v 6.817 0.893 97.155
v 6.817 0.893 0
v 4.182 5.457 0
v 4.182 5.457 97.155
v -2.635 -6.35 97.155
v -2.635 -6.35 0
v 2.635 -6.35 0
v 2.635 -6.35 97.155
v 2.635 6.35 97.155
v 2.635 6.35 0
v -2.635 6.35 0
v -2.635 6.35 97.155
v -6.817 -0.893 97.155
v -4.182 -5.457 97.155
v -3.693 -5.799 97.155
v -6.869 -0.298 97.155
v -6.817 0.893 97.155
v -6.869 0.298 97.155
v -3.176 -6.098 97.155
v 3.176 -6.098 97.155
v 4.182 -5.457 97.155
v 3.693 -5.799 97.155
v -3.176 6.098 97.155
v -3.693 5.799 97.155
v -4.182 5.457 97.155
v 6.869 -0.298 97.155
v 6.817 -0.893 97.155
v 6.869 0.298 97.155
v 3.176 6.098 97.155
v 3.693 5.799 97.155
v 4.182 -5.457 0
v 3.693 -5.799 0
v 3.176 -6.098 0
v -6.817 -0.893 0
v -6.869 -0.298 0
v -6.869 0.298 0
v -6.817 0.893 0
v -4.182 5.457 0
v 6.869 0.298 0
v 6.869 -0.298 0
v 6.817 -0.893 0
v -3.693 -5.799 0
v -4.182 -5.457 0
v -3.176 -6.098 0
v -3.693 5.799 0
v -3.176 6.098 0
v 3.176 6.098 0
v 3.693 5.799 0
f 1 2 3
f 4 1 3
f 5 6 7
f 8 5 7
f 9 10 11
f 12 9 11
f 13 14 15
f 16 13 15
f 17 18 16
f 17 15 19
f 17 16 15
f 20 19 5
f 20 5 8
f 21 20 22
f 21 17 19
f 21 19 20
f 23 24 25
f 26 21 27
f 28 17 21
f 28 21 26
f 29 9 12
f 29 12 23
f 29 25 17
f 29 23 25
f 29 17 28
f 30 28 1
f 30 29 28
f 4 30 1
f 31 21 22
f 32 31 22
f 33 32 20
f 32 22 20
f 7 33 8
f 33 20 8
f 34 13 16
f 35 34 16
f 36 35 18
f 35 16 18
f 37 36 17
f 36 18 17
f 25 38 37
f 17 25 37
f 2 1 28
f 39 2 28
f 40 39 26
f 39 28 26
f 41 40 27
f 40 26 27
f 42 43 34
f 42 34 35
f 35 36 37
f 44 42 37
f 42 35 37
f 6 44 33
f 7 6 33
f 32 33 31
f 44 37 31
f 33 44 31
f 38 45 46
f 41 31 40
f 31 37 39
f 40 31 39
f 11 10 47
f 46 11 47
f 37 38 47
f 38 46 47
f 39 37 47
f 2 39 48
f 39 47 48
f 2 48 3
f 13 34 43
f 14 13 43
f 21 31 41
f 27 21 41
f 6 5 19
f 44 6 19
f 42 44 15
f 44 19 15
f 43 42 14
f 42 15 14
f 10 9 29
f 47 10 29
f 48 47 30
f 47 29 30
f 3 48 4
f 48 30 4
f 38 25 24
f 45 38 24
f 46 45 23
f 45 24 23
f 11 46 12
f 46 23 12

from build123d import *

# Parameters (mm, degrees)
BOSS_EXTRUDE1_DEPTH = 7.9375
BOSS_EXTRUDE4_DEPTH = 89.2175
CUT_EXTRUDE2_DEPTH  = 98.63800417


with BuildPart() as part:
    # Sketch2 → Boss-Extrude1 (new body)
    with BuildSketch(Plane.XY):
        Polygon((7.332348419, 0), (3.666174209, 6.35), (-3.666174209, 6.35), (-7.332348419, 0), (-3.666174209, -6.35), (3.666174209, -6.35), align=None)
    extrude(amount=BOSS_EXTRUDE1_DEPTH)

    # Sketch5 → Boss-Extrude4 (add)
    with BuildSketch(Plane.XY.offset(7.9375)):
        Polygon((7.332348419, 0), (3.666174209, 6.35), (-3.666174209, 6.35), (-7.332348419, 0), (-3.666174209, -6.35), (3.666174209, -6.35), align=None)
    extrude(amount=BOSS_EXTRUDE4_DEPTH)

    # Sketch6 → Cut-Extrude2 (cut, through all)
    with BuildSketch(Plane.XY.offset(97.155)):
        with BuildLine():
            ThreePointArc((-4.181770802, 5.456960506), (-3.4375, 5.953924651), (-2.634981025, 6.35))
            Line((-2.634981025, 6.35), (-3.666174209, 6.35))
            Line((-3.666174209, 6.35), (-4.181770802, 5.456960506))
        make_face()
        with BuildLine():
            ThreePointArc((2.634981025, 6.35), (3.4375, 5.953924651), (4.181770802, 5.456960506))
            Line((4.181770802, 5.456960506), (3.666174209, 6.35))
            Line((3.666174209, 6.35), (2.634981025, 6.35))
        make_face()
        with BuildLine():
            ThreePointArc((6.816751826, 0.893039494), (6.875, 0), (6.816751826, -0.893039494))
            Line((6.816751826, -0.893039494), (7.332348419, 0))
            Line((7.332348419, 0), (6.816751826, 0.893039494))
        make_face()
        with BuildLine():
            Line((2.634981025, -6.35), (3.666174209, -6.35))
            Line((3.666174209, -6.35), (4.181770802, -5.456960506))
            ThreePointArc((4.181770802, -5.456960506), (3.4375, -5.953924651), (2.634981025, -6.35))
        make_face()
        with BuildLine():
            Line((-3.666174209, -6.35), (-2.634981025, -6.35))
            ThreePointArc((-2.634981025, -6.35), (-3.4375, -5.953924651), (-4.181770802, -5.456960506))
            Line((-4.181770802, -5.456960506), (-3.666174209, -6.35))
        make_face()
        with BuildLine():
            Line((-7.332348419, 0), (-6.816751826, -0.893039494))
            ThreePointArc((-6.816751826, -0.893039494), (-6.875, 0), (-6.816751826, 0.893039494))
            Line((-6.816751826, 0.893039494), (-7.332348419, 0))
        make_face()
    extrude(amount=-CUT_EXTRUDE2_DEPTH, mode=Mode.SUBTRACT)


solid = part.part
